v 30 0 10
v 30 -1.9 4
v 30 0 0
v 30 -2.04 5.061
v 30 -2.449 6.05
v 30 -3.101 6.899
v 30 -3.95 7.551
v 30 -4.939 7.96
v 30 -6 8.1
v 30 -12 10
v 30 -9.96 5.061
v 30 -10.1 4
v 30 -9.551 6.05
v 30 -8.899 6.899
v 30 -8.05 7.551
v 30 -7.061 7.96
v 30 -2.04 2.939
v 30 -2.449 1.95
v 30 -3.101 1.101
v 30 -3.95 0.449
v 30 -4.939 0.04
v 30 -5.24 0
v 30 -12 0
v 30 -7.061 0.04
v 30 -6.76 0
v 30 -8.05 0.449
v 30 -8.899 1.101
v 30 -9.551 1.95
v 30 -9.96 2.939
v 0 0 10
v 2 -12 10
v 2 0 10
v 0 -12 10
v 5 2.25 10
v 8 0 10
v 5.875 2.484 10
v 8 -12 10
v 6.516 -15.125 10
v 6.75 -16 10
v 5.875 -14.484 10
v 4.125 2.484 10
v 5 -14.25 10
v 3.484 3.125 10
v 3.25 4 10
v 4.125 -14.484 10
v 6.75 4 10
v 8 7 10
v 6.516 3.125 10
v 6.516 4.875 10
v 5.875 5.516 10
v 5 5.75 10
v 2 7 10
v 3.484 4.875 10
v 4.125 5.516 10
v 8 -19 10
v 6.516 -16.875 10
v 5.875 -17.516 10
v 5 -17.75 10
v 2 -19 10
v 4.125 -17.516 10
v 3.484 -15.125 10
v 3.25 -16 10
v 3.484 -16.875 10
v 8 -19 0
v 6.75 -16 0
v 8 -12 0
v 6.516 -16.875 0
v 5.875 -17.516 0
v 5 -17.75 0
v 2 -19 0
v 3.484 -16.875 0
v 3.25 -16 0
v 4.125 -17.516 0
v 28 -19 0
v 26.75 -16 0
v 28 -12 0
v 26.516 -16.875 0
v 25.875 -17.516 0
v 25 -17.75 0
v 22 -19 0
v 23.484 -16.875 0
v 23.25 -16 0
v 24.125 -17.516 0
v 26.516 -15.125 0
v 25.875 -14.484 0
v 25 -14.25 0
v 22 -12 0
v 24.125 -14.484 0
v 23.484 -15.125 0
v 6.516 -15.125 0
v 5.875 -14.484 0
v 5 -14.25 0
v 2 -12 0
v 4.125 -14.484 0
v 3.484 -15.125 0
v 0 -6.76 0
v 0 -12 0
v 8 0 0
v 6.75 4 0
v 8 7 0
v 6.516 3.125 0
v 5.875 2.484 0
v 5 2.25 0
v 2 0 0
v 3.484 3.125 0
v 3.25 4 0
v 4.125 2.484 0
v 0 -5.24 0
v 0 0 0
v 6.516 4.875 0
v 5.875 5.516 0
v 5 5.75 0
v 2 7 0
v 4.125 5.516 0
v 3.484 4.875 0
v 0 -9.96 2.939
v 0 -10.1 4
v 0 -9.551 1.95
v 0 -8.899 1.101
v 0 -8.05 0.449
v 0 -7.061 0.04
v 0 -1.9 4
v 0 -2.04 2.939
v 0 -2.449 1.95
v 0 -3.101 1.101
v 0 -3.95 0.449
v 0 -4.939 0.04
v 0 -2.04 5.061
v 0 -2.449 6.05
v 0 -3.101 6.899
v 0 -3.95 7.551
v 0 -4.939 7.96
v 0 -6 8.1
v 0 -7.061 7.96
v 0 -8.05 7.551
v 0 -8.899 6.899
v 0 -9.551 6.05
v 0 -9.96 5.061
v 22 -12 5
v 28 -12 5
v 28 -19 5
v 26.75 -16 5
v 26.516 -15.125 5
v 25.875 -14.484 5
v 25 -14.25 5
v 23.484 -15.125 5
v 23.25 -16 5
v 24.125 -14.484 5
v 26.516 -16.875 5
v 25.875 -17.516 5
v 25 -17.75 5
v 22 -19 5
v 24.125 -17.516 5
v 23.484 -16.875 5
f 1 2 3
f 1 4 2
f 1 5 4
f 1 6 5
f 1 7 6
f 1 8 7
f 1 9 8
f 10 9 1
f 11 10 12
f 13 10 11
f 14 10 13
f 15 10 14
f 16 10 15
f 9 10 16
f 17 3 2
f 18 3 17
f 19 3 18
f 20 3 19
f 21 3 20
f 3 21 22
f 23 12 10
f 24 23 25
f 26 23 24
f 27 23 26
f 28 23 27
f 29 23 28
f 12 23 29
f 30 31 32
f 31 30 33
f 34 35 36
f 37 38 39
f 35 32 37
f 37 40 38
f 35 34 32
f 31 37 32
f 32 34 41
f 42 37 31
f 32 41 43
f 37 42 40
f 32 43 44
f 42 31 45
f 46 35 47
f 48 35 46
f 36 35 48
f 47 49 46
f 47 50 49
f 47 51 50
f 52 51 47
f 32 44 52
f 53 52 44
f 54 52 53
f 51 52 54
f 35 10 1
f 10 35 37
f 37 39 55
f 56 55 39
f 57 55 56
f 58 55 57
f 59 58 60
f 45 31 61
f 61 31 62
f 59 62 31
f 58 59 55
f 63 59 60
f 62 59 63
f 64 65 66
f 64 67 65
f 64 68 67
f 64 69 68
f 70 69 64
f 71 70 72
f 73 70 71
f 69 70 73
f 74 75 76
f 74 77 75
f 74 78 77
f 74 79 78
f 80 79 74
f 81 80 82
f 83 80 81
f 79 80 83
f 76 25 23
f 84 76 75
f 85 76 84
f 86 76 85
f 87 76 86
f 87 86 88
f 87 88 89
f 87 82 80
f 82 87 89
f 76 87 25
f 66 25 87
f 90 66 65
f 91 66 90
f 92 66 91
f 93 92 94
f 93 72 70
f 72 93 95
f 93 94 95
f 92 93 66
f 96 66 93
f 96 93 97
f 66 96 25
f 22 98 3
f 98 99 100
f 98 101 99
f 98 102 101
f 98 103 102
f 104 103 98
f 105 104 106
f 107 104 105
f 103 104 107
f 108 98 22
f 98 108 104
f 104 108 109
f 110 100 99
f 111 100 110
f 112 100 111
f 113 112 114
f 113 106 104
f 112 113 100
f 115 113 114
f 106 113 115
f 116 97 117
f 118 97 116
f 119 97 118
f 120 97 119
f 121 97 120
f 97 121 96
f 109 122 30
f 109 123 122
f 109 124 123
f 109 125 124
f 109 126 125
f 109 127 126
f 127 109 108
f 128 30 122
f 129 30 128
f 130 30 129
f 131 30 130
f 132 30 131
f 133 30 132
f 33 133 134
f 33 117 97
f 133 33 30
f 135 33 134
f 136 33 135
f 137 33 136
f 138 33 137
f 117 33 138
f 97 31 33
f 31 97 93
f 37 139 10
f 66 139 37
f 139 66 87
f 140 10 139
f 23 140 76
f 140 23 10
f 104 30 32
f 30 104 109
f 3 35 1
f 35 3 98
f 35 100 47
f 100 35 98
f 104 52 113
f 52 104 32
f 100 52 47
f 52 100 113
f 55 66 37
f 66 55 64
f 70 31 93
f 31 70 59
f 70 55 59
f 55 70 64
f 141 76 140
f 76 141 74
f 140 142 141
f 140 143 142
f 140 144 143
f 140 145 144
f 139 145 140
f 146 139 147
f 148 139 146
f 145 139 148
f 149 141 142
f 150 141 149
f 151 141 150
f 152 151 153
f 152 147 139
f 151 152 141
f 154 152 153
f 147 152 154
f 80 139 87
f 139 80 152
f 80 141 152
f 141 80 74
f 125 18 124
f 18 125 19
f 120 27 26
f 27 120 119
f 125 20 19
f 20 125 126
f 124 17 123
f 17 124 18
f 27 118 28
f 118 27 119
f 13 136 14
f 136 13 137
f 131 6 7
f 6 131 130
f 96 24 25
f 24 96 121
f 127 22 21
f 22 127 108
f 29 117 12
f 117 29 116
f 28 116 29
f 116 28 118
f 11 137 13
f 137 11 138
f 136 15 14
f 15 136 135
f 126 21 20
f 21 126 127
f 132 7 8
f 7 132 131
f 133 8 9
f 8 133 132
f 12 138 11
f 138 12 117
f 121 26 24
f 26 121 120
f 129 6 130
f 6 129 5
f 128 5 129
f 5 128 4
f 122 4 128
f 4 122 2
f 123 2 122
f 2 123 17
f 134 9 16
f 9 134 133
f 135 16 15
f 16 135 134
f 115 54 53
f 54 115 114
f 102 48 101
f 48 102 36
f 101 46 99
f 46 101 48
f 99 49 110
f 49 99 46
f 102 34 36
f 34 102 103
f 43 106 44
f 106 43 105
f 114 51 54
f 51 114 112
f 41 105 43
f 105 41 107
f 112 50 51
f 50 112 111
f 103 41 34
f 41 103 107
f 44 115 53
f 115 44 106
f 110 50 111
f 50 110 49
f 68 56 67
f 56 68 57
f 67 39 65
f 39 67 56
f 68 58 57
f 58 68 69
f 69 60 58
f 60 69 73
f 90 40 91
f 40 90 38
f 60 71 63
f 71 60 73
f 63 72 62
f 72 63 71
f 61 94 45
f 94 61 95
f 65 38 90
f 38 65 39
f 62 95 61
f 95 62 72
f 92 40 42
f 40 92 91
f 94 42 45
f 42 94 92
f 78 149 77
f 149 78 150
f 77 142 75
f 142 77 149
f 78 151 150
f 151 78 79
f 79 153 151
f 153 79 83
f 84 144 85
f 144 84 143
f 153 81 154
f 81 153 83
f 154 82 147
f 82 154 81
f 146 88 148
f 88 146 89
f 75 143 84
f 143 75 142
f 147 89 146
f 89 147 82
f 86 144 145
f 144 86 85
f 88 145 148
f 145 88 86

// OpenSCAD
mirror([0,1,0])
difference()
{
    union()
    {
        cube([30,12,10]);
        
        translate([2,-4-3,0])
            cube([6,8,10]);
            //cylinder(d=3.5,h=4,$fn=12);
        translate([2,11,0])
            cube([6,8,10]);
        translate([2+20,11,0])
            cube([6,8,5]);
    }
    union()
    {
        translate([0,6,4])
            rotate([0,90,0])
                cylinder(d=8.2,h=30,$fn=24);
        
        translate([5,-4,0])
            cylinder(d=3.5,h=10,$fn=12);
        translate([5,6+6+4,0])
            cylinder(d=3.5,h=10,$fn=12);
        translate([5+20,6+6+4,0])
            cylinder(d=3.5,h=10,$fn=12);
    }
}
